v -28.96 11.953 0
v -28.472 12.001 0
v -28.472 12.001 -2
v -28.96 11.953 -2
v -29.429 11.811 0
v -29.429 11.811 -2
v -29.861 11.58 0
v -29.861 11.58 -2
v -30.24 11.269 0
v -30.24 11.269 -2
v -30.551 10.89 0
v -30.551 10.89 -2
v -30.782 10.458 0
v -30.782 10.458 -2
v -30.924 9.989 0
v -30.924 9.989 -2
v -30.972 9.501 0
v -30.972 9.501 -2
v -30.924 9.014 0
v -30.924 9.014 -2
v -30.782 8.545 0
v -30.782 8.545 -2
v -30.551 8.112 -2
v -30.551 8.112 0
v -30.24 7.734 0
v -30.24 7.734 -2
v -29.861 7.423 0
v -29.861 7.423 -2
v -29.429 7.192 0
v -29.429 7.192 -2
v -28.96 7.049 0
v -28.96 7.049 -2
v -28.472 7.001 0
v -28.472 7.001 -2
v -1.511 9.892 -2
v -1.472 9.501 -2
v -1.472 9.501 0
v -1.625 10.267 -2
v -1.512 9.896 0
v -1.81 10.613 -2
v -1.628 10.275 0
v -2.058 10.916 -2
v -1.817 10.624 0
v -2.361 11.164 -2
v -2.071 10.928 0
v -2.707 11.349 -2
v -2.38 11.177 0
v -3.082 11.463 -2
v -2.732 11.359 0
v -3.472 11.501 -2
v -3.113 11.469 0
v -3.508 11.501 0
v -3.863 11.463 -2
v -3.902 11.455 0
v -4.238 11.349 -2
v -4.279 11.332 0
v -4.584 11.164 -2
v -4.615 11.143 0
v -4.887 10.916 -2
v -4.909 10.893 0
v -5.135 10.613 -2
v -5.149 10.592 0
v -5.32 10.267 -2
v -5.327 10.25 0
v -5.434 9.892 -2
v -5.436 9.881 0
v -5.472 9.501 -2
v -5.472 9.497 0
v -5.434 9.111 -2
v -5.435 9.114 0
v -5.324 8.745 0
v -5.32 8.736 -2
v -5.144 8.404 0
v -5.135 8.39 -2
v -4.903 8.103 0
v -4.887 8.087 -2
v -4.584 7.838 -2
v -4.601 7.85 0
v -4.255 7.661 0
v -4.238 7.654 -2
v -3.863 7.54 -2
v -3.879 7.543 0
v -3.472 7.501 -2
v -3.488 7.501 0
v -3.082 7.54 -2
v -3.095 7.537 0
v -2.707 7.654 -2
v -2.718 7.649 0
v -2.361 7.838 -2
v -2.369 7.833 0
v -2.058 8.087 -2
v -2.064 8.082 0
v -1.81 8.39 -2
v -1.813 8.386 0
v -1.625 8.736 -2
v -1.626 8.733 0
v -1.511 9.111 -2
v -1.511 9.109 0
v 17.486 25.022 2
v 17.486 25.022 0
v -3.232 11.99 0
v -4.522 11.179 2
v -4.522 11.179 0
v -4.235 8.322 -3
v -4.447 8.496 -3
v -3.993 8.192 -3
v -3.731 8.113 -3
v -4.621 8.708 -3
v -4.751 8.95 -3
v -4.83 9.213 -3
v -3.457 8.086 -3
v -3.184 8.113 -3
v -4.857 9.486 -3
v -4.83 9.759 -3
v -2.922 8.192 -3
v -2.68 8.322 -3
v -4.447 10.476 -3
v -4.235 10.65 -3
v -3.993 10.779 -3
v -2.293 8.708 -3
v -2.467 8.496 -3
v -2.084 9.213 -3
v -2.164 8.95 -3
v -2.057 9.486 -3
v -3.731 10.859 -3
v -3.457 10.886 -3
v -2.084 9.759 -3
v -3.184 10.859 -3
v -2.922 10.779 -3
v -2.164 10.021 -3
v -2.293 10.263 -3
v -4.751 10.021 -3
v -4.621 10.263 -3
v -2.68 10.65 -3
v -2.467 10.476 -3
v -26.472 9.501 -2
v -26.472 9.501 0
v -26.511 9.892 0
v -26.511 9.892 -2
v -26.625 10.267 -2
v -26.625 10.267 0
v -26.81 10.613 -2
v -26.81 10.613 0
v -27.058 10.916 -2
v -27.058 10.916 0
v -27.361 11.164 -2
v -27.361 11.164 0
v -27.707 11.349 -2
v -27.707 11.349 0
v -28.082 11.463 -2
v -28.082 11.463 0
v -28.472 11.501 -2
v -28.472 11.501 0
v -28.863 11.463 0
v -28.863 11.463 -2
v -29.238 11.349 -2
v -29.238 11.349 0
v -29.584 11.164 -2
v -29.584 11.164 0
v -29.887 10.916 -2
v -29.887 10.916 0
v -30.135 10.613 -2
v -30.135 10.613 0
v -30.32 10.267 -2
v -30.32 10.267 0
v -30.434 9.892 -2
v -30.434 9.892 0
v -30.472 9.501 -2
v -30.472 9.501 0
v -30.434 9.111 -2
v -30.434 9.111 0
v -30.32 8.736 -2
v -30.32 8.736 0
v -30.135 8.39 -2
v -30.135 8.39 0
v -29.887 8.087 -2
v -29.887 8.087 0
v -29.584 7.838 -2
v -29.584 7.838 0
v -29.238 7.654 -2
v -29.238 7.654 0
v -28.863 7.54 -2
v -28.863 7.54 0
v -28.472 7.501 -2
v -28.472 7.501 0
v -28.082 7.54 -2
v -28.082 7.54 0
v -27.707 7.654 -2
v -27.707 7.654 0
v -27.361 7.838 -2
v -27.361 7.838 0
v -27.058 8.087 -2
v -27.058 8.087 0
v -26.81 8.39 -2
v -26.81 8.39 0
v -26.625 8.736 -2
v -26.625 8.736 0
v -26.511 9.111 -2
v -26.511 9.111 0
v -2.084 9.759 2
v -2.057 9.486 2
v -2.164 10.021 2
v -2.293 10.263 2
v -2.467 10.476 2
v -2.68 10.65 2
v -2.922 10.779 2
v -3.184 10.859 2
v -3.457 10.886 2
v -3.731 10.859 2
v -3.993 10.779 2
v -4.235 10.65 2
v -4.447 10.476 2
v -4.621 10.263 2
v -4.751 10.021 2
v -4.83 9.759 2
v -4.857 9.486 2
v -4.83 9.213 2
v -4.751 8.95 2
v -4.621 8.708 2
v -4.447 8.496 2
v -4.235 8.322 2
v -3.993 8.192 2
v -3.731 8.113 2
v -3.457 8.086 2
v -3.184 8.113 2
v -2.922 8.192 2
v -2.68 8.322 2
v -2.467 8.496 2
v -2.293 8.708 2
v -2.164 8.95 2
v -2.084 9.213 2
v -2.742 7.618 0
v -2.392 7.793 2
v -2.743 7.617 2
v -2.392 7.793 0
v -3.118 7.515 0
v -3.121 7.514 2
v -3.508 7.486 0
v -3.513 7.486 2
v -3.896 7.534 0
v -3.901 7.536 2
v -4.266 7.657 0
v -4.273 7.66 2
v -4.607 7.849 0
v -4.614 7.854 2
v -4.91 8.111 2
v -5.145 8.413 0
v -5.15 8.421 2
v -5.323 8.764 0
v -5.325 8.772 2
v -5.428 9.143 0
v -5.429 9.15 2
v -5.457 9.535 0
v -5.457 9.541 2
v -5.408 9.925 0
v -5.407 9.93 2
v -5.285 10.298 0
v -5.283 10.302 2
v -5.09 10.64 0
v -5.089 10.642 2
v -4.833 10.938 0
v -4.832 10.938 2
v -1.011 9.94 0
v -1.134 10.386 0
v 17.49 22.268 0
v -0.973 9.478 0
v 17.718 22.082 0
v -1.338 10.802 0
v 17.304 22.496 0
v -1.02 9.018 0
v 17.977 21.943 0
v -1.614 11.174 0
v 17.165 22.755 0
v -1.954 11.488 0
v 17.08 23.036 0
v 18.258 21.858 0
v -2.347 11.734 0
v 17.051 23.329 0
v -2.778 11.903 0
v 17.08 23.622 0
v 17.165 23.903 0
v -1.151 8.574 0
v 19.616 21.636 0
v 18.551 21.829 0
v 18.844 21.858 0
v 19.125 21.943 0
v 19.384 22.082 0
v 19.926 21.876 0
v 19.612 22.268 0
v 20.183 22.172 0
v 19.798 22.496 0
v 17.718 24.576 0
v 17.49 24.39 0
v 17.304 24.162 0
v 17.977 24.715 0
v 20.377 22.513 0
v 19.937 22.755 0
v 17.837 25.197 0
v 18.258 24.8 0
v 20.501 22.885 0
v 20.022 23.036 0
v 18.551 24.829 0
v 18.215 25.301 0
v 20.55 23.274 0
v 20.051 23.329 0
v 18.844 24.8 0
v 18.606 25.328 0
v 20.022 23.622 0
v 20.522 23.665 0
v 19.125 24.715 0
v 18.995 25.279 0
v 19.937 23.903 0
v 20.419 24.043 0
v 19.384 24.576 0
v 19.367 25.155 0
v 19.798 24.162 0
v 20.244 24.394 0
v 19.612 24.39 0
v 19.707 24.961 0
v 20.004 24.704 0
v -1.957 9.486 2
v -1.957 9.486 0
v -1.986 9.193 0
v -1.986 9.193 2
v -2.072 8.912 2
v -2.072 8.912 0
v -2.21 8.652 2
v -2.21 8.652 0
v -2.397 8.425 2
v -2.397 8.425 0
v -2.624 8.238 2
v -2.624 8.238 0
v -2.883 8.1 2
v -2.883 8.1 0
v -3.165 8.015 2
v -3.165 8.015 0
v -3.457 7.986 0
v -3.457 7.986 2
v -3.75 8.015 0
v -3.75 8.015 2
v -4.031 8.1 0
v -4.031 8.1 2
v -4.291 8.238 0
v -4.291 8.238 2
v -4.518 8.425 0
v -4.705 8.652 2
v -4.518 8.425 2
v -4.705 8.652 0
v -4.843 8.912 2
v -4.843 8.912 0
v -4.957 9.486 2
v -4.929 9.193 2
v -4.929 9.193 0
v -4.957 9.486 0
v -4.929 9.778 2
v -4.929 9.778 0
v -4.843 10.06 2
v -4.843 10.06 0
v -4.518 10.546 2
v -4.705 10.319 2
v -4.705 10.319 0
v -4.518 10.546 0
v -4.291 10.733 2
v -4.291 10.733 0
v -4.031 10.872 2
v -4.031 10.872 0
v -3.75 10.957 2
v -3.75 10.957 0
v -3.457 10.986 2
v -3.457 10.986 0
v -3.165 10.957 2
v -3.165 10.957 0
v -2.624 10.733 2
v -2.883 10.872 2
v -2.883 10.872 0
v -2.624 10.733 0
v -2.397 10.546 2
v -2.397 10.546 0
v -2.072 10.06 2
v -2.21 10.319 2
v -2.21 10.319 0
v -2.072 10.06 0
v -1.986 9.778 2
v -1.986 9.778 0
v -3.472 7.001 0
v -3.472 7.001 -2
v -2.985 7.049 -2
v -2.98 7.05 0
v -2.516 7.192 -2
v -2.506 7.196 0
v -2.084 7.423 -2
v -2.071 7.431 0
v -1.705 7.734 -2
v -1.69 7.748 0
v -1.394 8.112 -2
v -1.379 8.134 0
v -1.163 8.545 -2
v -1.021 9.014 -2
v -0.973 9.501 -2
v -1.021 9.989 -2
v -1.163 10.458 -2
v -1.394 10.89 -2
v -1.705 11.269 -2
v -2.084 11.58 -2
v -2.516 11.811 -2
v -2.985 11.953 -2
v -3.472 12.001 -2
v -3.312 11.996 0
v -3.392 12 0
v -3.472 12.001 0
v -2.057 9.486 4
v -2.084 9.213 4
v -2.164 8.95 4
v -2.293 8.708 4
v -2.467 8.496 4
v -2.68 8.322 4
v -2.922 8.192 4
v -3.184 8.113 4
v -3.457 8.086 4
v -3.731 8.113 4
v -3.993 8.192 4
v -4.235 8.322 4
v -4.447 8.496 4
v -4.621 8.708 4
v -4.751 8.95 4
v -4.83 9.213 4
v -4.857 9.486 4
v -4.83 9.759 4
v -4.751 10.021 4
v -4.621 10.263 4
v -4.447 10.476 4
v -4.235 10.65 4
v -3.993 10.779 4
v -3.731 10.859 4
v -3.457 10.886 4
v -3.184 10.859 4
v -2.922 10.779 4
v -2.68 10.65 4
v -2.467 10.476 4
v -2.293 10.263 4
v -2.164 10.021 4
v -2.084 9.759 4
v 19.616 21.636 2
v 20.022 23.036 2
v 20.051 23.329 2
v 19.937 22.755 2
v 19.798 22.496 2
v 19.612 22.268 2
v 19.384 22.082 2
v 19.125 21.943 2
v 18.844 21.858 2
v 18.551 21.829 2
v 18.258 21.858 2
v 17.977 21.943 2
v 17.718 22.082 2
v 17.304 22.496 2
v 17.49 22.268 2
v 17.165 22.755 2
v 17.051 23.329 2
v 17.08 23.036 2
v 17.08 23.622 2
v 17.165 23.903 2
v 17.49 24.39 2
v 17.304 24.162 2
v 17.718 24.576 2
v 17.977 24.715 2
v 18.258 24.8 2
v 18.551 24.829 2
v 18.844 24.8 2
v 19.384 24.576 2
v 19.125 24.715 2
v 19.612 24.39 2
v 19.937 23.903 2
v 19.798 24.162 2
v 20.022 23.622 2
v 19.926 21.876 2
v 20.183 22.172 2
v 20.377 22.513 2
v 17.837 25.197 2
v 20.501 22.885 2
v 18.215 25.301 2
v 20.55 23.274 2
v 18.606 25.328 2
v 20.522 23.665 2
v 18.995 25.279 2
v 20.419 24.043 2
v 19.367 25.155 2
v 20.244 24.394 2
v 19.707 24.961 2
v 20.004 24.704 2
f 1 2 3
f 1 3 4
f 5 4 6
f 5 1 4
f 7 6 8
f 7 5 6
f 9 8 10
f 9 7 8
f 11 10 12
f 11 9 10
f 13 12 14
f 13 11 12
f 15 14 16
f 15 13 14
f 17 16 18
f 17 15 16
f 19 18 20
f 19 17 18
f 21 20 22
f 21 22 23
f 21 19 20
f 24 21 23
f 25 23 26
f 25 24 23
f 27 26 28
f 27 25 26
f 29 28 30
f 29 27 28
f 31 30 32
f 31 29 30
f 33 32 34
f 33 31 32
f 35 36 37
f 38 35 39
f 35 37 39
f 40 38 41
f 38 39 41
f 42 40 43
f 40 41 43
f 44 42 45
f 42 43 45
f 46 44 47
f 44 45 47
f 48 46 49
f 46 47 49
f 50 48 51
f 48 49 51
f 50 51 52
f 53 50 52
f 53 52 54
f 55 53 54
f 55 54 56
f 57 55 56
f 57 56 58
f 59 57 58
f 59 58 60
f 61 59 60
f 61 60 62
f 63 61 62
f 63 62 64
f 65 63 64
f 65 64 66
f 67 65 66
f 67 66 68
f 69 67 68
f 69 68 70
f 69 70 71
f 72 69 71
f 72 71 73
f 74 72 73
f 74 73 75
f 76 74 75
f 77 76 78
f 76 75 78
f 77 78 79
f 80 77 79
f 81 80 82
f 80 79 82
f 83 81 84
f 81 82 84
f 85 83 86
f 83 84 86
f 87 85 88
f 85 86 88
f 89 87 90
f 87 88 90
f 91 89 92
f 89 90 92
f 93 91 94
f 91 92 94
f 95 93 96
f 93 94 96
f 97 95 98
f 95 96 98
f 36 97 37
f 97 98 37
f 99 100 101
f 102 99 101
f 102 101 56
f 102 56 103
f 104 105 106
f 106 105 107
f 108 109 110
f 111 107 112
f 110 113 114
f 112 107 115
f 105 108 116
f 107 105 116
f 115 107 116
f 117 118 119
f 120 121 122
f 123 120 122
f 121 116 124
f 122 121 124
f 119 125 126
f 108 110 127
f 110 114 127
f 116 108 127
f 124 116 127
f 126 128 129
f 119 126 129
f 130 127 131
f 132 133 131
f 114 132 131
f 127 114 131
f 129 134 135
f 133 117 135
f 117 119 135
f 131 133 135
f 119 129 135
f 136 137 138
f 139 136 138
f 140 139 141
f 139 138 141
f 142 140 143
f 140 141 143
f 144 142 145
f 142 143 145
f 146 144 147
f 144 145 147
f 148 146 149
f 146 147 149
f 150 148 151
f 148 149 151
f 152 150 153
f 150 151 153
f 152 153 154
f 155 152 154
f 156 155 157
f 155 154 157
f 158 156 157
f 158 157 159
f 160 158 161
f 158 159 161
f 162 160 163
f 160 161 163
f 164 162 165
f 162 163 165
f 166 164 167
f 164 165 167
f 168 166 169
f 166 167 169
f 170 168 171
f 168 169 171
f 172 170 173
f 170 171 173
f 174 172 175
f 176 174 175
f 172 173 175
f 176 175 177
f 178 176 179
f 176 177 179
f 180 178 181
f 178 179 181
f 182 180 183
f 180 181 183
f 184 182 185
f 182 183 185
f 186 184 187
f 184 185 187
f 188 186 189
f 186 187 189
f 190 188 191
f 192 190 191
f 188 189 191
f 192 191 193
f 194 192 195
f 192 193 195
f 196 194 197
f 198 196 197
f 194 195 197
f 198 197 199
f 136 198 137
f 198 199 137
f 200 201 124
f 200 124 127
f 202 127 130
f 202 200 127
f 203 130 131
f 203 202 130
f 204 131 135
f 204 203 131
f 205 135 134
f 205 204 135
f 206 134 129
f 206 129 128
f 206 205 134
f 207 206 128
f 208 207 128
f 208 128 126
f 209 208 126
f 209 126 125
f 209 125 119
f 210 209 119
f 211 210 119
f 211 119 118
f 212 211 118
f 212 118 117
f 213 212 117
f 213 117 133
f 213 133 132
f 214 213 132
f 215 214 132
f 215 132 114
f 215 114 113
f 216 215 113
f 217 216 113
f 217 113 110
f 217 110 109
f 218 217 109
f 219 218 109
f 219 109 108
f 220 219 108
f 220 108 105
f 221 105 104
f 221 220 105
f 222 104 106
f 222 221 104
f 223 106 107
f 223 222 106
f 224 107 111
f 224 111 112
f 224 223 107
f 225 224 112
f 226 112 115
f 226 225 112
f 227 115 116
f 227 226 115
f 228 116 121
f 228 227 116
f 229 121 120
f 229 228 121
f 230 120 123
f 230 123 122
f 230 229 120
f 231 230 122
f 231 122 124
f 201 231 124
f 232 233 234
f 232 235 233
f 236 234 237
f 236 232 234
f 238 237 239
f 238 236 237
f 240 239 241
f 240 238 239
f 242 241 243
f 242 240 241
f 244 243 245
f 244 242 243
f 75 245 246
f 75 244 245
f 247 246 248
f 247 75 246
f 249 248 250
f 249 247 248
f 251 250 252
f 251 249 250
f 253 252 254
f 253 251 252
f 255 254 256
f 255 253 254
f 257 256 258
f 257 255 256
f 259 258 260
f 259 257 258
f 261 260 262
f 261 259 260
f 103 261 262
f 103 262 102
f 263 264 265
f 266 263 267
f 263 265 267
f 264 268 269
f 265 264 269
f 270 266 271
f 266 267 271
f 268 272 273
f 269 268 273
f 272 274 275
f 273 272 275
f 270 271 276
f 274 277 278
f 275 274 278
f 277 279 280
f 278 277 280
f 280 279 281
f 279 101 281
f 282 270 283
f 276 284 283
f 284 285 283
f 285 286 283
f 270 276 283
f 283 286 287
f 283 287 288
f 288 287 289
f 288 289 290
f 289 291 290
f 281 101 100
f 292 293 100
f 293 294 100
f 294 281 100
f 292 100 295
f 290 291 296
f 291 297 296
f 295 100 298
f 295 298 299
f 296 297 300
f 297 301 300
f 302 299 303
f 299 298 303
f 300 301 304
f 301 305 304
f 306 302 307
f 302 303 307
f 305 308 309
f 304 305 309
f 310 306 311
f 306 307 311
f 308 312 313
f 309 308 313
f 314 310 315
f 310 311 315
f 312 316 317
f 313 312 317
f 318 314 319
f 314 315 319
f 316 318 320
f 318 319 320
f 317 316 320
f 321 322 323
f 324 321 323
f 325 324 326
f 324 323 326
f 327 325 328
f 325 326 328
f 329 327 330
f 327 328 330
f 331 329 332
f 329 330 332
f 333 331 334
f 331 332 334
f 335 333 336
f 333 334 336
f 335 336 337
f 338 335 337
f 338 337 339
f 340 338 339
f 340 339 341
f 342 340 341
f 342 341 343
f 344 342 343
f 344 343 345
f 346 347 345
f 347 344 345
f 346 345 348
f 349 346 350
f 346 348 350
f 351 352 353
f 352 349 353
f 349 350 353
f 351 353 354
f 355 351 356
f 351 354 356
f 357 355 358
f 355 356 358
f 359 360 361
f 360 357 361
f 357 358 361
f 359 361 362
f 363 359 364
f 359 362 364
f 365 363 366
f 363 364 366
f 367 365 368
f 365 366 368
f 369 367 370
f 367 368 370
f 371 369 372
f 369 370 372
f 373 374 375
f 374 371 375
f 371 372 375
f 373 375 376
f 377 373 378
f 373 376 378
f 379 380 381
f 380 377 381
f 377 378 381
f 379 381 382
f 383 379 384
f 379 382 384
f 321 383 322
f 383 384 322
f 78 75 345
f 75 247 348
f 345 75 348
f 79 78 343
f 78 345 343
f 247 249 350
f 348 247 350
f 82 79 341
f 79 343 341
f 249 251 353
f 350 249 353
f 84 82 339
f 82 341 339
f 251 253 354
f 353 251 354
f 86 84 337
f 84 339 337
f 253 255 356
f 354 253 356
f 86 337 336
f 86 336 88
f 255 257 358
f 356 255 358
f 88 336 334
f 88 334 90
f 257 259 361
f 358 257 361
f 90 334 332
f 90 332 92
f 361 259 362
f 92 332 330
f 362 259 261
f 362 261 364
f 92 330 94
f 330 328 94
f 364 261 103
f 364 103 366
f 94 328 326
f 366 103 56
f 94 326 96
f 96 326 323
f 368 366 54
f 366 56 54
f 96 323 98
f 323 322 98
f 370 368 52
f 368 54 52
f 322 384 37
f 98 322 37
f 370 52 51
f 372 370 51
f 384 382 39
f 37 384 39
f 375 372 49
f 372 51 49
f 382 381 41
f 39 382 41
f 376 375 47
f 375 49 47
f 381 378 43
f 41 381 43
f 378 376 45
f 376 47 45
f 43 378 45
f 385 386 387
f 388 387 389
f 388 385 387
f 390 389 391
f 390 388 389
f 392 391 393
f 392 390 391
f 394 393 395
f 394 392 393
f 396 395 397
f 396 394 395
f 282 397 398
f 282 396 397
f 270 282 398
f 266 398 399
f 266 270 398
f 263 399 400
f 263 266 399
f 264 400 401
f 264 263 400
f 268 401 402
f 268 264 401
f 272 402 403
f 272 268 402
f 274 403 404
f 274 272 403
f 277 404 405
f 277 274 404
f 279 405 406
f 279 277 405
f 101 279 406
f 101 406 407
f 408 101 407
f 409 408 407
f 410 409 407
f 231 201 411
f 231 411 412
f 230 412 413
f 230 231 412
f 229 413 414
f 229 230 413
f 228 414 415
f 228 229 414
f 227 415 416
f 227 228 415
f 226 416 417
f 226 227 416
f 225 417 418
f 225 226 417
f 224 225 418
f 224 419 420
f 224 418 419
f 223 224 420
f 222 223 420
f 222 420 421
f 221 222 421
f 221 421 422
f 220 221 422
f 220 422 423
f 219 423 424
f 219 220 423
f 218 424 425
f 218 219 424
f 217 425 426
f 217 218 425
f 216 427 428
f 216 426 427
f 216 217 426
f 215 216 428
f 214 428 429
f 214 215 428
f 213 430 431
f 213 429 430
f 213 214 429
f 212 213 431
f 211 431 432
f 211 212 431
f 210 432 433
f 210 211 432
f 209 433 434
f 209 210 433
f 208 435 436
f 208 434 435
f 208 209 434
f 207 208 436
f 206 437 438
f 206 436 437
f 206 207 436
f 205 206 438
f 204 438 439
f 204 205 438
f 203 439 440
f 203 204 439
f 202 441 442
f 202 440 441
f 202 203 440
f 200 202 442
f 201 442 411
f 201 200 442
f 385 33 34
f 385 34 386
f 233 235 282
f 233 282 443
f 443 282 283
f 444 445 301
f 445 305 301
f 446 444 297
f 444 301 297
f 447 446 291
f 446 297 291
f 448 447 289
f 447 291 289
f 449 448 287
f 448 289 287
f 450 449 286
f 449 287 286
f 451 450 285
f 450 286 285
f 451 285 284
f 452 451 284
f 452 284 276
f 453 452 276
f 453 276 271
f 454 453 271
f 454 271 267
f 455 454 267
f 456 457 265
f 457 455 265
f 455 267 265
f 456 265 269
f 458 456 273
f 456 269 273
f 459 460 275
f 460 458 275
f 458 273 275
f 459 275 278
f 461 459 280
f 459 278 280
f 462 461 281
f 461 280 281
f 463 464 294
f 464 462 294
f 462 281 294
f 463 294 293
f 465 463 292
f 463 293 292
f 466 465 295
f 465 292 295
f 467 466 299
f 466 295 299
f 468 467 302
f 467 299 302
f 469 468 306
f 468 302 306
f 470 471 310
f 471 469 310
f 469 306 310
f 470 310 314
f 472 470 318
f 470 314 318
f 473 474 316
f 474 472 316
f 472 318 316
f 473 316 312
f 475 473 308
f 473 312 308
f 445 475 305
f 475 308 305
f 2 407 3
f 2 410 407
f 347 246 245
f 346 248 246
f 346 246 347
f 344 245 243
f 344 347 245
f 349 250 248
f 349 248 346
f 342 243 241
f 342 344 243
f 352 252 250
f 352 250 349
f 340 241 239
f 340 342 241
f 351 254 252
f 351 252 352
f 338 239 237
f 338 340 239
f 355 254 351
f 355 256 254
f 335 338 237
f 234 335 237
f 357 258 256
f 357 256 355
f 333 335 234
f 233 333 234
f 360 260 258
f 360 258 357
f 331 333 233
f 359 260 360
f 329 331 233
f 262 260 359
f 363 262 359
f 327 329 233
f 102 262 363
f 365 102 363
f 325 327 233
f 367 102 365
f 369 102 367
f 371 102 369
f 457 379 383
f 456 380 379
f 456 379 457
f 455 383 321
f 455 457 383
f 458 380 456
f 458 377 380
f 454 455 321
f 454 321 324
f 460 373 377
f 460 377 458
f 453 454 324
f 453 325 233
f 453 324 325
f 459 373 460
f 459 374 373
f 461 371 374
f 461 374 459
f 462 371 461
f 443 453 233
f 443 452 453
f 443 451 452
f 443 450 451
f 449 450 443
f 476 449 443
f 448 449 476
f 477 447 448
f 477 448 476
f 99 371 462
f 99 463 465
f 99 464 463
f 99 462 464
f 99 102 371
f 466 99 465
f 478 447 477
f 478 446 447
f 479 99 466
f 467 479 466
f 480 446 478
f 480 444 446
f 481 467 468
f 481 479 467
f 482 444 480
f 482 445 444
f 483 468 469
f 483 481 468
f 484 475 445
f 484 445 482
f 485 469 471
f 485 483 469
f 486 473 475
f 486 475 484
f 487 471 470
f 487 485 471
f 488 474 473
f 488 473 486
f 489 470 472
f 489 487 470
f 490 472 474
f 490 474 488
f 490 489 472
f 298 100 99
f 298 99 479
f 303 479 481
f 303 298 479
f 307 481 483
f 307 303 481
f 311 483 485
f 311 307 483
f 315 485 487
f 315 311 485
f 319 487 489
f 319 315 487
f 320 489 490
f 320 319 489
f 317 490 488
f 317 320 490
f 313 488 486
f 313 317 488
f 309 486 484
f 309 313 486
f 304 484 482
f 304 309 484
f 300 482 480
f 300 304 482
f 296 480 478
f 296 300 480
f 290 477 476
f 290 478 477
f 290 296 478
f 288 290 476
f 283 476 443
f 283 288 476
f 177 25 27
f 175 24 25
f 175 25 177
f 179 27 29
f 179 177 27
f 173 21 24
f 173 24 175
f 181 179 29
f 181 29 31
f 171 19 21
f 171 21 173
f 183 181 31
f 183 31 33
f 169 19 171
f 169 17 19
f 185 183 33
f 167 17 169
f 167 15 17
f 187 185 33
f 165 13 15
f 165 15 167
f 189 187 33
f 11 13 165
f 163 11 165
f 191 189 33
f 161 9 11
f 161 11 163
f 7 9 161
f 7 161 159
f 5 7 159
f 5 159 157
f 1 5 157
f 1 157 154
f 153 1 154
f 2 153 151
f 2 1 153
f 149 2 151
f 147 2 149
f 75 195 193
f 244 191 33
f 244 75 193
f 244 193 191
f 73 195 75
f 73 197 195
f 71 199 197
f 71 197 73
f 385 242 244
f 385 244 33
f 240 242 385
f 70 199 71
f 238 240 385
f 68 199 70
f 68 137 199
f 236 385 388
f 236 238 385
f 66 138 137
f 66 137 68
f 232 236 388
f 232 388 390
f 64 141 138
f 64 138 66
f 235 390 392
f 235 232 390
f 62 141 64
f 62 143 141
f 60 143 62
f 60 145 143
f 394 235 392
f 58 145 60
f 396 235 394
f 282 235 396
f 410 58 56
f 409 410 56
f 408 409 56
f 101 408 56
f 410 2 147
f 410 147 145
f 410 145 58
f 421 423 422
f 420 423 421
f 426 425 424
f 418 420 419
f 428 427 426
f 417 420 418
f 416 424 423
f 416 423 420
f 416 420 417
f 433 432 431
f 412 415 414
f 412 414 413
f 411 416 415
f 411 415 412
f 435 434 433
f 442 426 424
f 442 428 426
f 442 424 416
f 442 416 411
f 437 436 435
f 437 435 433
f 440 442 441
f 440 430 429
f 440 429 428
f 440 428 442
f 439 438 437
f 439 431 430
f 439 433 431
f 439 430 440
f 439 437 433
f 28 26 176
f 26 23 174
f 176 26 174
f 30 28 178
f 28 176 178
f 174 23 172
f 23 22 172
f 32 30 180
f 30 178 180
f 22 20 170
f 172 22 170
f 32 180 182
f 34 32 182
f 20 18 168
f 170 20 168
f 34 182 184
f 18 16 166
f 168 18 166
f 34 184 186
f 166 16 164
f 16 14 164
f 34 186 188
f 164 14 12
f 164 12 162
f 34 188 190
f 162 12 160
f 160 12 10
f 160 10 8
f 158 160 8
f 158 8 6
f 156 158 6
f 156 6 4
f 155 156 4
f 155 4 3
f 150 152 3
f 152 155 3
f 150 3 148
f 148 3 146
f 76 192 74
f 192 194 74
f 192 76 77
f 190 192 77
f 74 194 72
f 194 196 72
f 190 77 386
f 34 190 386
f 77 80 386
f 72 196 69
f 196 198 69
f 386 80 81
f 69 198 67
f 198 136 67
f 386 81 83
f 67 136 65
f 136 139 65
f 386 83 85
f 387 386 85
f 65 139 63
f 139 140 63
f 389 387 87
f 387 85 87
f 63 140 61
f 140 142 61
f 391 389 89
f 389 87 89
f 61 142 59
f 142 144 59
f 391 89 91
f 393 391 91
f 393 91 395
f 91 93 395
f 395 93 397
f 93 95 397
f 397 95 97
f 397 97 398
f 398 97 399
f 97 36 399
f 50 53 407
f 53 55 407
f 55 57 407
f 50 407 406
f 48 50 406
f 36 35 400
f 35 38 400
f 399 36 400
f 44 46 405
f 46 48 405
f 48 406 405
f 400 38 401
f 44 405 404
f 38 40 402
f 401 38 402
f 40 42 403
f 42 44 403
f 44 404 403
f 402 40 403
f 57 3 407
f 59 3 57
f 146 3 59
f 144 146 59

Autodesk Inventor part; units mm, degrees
ref_plane "YZ Plane" through (0, 0, 0) normal (1, 0, 0) x (0, 1, 0)
ref_plane "XZ Plane" through (0, 0, 0) normal (0, 1, 0) x (-1, 0, 0)
ref_plane "XY Plane" through (0, 0, 0) normal (0, 0, 1) x (1, 0, 0)
sketch "Sketch1" plane through (0, 0, 0) normal (0, 0, 1) x (1, 0, 0)
  line L0 (-30.9725, 9.5014) -> (-0.9725, 9.5014) construction
  line L1 (-28.4725, 7.0014) -> (-3.4725, 7.0014)
  line L2 (-3.4725, 12.0014) -> (-28.4725, 12.0014)
  arc A0 (-28.4725, 12.0014) -> (-28.4725, 7.0014) centre (-28.4725, 9.5014) ccw
  arc A1 (-3.4725, 7.0014) -> (-3.4725, 12.0014) centre (-3.4725, 9.5014) ccw
  circle A2 centre (-28.4725, 9.5014) radius 2
  circle A3 centre (-3.4725, 9.5014) radius 2
  point P0 (0, 0)
  point P1 (-15.9725, 9.5014)
  dimension "d0" = 30
  dimension "d1" = 5
  dimension "d2" = 4
  dimension "d3" = 4
sketch "Sketch2" plane through (0, 0, 0) normal (0, 0, 1) x (1, 0, 0)
  line L0 (-5.1503, 8.4208) -> (20.2439, 24.3938) construction
  line L1 (-2.3925, 7.7927) -> (19.6158, 21.636)
  line L2 (17.486, 25.0219) -> (-4.5222, 11.1786)
  arc A0 (-4.5222, 11.1786) -> (-2.3925, 7.7927) centre (-3.4574, 9.4857) ccw
  arc A1 (19.6158, 21.636) -> (17.486, 25.0219) centre (18.5509, 23.3289) ccw
  circle A2 centre (18.5509, 23.3289) radius 1.5
  circle A3 centre (-3.4574, 9.4857) radius 1.5
  circle A4 centre (-3.4574, 9.4857) radius 1.5
  point P0 (0, 0)
  point P1 (7.5468, 16.4073)
  dimension "d4" = 30
  dimension "d5" = 4
  dimension "d6" = 3
  dimension "d9" = 3
  dimension "d12" = 3
extrude "Extrusion1" add sketch "Sketch1" against normal blind 2
extrude "Extrusion2" add sketch "Sketch2" along normal blind 2
sketch "Sketch5" plane through (0, 0, 2) normal (0, 0, 1) x (1, 0, 0)
  circle A0 centre (-3.4574, 9.4857) radius 1.4
  circle A1 centre (-3.4574, 9.4857) radius 1.5 projected
  point P0 (0, 0)
  dimension "d13" = 2.8
extrude "Extrusion3" add sketch "Sketch5" along normal blind 2 and the other way blind 5 contours A0
